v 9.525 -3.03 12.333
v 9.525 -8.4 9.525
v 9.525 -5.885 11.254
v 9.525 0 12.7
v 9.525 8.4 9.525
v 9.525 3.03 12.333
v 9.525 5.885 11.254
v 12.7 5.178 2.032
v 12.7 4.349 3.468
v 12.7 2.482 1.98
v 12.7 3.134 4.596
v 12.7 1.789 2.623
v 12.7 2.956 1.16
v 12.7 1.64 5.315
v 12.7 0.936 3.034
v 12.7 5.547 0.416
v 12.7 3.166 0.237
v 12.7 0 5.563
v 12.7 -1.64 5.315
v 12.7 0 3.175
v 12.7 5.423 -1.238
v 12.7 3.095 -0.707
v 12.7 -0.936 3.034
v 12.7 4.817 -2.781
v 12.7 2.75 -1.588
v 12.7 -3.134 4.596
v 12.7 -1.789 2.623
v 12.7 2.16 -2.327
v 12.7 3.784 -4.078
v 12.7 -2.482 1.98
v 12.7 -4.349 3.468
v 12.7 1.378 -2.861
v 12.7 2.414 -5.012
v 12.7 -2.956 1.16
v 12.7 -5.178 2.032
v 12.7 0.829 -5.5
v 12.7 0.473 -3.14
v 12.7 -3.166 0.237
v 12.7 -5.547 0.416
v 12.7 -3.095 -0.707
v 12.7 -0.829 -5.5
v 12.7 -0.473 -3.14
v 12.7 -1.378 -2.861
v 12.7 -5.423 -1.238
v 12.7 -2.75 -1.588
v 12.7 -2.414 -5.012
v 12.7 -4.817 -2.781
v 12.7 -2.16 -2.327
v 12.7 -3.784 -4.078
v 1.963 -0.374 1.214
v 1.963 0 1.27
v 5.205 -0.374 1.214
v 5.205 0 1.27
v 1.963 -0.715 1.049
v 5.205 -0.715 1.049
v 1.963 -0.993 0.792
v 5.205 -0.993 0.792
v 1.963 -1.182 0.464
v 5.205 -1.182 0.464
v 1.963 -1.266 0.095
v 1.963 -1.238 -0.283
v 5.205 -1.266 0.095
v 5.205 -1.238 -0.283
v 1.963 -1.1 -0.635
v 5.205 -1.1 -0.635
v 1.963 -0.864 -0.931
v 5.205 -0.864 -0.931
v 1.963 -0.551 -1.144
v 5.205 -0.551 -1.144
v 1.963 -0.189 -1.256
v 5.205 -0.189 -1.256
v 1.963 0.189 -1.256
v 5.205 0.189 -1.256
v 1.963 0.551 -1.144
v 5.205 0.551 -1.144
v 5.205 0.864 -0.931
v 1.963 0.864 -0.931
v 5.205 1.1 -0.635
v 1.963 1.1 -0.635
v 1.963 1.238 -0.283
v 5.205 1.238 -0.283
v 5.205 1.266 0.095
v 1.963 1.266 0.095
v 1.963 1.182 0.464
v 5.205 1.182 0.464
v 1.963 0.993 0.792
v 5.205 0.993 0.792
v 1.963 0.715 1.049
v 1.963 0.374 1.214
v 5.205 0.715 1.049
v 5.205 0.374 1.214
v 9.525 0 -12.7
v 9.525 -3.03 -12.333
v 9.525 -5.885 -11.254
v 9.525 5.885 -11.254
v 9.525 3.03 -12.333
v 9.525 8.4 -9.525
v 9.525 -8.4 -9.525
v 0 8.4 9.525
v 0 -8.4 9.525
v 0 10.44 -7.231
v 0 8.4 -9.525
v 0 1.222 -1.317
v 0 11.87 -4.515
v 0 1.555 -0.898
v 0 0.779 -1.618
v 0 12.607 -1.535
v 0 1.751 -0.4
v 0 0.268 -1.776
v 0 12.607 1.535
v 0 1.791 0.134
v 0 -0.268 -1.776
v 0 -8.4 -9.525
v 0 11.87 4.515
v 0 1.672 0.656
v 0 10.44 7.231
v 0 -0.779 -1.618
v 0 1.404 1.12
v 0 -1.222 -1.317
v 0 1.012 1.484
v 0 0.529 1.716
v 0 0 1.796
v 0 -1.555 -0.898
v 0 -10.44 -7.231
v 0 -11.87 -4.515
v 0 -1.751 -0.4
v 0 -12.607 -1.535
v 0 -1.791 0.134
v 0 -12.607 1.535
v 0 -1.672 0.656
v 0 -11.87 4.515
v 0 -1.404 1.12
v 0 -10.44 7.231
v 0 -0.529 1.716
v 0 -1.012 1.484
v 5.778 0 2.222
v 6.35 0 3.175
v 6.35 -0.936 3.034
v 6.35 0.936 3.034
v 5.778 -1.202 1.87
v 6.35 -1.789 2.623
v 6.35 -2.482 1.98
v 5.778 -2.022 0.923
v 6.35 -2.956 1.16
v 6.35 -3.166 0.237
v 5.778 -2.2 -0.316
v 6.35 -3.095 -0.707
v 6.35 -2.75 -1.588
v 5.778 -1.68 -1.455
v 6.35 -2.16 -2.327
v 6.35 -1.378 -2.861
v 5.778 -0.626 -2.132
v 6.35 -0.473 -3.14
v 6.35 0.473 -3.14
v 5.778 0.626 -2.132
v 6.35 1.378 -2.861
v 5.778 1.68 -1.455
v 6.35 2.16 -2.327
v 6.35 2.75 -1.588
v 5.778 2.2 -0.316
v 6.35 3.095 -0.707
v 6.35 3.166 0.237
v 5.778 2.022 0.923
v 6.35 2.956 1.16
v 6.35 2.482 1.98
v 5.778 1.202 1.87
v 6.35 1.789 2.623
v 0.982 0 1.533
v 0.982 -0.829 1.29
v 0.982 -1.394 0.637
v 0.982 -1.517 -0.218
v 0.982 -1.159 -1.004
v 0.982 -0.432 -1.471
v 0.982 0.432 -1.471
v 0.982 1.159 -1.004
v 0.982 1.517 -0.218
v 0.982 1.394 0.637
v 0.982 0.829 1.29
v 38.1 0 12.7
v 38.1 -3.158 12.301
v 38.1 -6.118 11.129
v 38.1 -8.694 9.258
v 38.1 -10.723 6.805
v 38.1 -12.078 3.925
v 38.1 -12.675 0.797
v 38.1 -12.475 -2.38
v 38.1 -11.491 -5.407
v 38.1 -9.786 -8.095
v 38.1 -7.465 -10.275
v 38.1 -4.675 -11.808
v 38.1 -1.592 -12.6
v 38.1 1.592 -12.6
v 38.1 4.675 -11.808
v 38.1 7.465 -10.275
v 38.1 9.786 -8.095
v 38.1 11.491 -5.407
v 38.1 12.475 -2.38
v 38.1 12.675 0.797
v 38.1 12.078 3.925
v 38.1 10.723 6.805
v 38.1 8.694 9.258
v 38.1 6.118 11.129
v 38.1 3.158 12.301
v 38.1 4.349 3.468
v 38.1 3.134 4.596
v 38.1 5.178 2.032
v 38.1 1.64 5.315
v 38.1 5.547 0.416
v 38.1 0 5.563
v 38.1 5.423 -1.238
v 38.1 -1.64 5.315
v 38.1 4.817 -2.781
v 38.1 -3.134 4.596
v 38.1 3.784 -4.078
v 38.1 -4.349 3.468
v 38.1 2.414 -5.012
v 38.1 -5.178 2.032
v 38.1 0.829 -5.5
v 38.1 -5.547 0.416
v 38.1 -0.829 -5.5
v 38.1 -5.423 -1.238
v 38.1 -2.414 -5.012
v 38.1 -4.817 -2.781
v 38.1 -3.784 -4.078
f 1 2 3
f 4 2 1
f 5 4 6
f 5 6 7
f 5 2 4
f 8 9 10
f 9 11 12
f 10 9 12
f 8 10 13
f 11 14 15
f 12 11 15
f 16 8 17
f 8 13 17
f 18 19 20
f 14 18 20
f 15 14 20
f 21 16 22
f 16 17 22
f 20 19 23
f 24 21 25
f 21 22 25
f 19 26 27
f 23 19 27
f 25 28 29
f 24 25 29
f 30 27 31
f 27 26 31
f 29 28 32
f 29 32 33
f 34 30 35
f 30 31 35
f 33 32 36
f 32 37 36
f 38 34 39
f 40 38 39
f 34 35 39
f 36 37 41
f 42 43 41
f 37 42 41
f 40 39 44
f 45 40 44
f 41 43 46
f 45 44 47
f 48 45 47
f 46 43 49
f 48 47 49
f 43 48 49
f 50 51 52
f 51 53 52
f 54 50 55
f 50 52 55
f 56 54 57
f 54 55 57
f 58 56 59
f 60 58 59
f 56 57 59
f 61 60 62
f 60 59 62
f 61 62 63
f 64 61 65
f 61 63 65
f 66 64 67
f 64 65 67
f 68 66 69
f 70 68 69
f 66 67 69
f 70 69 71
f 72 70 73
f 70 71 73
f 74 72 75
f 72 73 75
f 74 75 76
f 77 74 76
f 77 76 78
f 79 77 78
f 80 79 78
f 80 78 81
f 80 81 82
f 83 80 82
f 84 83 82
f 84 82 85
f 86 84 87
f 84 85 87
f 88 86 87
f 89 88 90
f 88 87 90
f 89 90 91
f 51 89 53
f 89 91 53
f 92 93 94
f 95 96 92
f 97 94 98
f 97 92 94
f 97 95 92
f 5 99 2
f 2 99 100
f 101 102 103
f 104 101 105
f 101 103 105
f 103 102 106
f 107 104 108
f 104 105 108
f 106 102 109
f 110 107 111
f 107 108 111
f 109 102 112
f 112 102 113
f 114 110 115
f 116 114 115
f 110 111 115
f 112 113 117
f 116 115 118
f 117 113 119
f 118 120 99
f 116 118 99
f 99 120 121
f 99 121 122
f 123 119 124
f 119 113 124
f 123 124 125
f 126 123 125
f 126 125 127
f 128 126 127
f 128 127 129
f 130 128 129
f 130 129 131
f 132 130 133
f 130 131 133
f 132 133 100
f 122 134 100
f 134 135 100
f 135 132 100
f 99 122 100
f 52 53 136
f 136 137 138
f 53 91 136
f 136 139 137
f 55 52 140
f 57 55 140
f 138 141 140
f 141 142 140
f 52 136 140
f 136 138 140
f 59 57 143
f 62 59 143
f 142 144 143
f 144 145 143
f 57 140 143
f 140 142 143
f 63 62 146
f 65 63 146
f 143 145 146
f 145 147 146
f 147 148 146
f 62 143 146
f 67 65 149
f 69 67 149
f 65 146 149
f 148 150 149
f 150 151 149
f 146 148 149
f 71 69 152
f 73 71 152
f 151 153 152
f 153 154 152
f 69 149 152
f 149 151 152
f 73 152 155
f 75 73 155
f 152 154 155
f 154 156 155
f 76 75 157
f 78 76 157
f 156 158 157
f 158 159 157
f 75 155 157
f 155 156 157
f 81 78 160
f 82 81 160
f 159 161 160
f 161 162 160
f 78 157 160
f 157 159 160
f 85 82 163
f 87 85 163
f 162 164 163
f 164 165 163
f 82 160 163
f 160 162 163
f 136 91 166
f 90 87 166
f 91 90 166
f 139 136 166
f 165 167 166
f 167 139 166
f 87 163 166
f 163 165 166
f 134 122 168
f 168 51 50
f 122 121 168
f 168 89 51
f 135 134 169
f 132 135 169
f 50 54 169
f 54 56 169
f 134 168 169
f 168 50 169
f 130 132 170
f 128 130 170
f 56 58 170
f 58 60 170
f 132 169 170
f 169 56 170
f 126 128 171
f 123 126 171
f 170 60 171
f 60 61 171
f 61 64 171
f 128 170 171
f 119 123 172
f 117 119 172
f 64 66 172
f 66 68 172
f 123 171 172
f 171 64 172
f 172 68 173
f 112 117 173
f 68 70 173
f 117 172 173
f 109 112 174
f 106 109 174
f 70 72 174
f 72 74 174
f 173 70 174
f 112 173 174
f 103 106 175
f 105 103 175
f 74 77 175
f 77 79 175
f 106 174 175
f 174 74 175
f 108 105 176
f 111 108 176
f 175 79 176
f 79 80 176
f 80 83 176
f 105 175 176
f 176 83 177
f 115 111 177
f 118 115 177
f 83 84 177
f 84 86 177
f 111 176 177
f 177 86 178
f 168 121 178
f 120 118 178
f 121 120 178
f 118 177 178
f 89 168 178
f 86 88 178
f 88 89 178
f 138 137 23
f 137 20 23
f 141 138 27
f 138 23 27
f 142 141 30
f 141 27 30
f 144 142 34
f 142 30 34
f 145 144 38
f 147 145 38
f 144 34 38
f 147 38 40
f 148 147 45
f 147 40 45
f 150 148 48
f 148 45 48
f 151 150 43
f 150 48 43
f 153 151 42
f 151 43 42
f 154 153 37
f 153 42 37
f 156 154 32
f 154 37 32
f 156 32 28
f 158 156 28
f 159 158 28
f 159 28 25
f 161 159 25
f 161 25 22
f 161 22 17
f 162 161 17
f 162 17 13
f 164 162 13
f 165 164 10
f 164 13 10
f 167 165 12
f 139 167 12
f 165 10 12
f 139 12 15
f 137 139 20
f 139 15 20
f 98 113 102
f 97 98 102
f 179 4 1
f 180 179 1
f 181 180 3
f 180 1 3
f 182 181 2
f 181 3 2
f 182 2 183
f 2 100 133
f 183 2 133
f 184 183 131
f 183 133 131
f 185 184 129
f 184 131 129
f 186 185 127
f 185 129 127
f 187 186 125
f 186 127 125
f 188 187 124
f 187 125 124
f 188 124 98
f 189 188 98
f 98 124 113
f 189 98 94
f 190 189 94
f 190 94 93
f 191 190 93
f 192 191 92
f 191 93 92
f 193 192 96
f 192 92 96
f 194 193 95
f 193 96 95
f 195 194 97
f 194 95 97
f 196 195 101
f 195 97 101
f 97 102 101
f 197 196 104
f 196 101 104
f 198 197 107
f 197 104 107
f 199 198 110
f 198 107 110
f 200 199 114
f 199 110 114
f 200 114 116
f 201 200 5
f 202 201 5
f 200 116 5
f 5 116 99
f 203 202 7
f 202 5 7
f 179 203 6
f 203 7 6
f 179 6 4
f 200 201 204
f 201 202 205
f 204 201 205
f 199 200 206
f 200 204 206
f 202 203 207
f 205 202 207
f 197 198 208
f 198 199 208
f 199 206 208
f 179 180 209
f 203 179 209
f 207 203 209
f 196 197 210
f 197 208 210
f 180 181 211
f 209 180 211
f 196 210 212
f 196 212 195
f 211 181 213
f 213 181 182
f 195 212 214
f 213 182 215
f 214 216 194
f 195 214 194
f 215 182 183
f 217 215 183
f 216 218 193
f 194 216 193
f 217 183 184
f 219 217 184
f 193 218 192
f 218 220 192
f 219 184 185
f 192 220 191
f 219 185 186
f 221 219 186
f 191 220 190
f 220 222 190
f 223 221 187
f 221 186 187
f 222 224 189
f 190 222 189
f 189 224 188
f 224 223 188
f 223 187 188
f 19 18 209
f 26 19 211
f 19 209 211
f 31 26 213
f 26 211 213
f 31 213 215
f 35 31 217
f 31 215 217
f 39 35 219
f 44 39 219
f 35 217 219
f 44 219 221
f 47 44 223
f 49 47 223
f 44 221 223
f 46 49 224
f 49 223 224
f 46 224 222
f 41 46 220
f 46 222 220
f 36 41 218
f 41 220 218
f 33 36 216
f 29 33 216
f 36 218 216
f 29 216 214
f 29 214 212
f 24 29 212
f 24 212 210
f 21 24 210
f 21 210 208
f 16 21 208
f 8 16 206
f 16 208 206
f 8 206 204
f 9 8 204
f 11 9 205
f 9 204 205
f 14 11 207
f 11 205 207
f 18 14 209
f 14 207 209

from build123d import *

# Parameters (mm, degrees)
CUT_EXTRUDE1_DEPTH = 9.525


with BuildPart() as part:
    # Sketch1 → Revolve1 (revolve)
    with BuildSketch(Plane.XY, mode=Mode.PRIVATE) as revolve1_sk:
        Polygon((0, 1.796034), (1.963185615, 1.27), (5.205360521, 1.27), (6.35, 3.175), (12.7, 3.175), (12.7, 5.5626), (38.1, 5.5626), (38.1, 12.7), (0, 12.7), align=None)
    revolve(revolve1_sk.sketch.rotate(Axis((0, 0, 0), (1, 0, 0)), 90), axis=Axis((0, 0, 0), (1, 0, 0)))

    # Sketch2 → Cut-Extrude1 (cut)
    with BuildSketch(Plane.ZY):
        with BuildLine():
            ThreePointArc((-9.525, 8.400260413), (-12.7, 0), (-9.525, -8.400260413))
            Line((-9.525, -8.400260413), (-9.525, 8.400260413))
        make_face()
        with BuildLine():
            Line((9.525, 8.400260413), (9.525, -8.400260413))
            ThreePointArc((9.525, -8.400260413), (11.879762203, -4.490128061), (12.7, 0))
            ThreePointArc((12.7, 0), (11.879762203, 4.490128061), (9.525, 8.400260413))
        make_face()
    extrude(amount=-CUT_EXTRUDE1_DEPTH, mode=Mode.SUBTRACT)


solid = part.part
